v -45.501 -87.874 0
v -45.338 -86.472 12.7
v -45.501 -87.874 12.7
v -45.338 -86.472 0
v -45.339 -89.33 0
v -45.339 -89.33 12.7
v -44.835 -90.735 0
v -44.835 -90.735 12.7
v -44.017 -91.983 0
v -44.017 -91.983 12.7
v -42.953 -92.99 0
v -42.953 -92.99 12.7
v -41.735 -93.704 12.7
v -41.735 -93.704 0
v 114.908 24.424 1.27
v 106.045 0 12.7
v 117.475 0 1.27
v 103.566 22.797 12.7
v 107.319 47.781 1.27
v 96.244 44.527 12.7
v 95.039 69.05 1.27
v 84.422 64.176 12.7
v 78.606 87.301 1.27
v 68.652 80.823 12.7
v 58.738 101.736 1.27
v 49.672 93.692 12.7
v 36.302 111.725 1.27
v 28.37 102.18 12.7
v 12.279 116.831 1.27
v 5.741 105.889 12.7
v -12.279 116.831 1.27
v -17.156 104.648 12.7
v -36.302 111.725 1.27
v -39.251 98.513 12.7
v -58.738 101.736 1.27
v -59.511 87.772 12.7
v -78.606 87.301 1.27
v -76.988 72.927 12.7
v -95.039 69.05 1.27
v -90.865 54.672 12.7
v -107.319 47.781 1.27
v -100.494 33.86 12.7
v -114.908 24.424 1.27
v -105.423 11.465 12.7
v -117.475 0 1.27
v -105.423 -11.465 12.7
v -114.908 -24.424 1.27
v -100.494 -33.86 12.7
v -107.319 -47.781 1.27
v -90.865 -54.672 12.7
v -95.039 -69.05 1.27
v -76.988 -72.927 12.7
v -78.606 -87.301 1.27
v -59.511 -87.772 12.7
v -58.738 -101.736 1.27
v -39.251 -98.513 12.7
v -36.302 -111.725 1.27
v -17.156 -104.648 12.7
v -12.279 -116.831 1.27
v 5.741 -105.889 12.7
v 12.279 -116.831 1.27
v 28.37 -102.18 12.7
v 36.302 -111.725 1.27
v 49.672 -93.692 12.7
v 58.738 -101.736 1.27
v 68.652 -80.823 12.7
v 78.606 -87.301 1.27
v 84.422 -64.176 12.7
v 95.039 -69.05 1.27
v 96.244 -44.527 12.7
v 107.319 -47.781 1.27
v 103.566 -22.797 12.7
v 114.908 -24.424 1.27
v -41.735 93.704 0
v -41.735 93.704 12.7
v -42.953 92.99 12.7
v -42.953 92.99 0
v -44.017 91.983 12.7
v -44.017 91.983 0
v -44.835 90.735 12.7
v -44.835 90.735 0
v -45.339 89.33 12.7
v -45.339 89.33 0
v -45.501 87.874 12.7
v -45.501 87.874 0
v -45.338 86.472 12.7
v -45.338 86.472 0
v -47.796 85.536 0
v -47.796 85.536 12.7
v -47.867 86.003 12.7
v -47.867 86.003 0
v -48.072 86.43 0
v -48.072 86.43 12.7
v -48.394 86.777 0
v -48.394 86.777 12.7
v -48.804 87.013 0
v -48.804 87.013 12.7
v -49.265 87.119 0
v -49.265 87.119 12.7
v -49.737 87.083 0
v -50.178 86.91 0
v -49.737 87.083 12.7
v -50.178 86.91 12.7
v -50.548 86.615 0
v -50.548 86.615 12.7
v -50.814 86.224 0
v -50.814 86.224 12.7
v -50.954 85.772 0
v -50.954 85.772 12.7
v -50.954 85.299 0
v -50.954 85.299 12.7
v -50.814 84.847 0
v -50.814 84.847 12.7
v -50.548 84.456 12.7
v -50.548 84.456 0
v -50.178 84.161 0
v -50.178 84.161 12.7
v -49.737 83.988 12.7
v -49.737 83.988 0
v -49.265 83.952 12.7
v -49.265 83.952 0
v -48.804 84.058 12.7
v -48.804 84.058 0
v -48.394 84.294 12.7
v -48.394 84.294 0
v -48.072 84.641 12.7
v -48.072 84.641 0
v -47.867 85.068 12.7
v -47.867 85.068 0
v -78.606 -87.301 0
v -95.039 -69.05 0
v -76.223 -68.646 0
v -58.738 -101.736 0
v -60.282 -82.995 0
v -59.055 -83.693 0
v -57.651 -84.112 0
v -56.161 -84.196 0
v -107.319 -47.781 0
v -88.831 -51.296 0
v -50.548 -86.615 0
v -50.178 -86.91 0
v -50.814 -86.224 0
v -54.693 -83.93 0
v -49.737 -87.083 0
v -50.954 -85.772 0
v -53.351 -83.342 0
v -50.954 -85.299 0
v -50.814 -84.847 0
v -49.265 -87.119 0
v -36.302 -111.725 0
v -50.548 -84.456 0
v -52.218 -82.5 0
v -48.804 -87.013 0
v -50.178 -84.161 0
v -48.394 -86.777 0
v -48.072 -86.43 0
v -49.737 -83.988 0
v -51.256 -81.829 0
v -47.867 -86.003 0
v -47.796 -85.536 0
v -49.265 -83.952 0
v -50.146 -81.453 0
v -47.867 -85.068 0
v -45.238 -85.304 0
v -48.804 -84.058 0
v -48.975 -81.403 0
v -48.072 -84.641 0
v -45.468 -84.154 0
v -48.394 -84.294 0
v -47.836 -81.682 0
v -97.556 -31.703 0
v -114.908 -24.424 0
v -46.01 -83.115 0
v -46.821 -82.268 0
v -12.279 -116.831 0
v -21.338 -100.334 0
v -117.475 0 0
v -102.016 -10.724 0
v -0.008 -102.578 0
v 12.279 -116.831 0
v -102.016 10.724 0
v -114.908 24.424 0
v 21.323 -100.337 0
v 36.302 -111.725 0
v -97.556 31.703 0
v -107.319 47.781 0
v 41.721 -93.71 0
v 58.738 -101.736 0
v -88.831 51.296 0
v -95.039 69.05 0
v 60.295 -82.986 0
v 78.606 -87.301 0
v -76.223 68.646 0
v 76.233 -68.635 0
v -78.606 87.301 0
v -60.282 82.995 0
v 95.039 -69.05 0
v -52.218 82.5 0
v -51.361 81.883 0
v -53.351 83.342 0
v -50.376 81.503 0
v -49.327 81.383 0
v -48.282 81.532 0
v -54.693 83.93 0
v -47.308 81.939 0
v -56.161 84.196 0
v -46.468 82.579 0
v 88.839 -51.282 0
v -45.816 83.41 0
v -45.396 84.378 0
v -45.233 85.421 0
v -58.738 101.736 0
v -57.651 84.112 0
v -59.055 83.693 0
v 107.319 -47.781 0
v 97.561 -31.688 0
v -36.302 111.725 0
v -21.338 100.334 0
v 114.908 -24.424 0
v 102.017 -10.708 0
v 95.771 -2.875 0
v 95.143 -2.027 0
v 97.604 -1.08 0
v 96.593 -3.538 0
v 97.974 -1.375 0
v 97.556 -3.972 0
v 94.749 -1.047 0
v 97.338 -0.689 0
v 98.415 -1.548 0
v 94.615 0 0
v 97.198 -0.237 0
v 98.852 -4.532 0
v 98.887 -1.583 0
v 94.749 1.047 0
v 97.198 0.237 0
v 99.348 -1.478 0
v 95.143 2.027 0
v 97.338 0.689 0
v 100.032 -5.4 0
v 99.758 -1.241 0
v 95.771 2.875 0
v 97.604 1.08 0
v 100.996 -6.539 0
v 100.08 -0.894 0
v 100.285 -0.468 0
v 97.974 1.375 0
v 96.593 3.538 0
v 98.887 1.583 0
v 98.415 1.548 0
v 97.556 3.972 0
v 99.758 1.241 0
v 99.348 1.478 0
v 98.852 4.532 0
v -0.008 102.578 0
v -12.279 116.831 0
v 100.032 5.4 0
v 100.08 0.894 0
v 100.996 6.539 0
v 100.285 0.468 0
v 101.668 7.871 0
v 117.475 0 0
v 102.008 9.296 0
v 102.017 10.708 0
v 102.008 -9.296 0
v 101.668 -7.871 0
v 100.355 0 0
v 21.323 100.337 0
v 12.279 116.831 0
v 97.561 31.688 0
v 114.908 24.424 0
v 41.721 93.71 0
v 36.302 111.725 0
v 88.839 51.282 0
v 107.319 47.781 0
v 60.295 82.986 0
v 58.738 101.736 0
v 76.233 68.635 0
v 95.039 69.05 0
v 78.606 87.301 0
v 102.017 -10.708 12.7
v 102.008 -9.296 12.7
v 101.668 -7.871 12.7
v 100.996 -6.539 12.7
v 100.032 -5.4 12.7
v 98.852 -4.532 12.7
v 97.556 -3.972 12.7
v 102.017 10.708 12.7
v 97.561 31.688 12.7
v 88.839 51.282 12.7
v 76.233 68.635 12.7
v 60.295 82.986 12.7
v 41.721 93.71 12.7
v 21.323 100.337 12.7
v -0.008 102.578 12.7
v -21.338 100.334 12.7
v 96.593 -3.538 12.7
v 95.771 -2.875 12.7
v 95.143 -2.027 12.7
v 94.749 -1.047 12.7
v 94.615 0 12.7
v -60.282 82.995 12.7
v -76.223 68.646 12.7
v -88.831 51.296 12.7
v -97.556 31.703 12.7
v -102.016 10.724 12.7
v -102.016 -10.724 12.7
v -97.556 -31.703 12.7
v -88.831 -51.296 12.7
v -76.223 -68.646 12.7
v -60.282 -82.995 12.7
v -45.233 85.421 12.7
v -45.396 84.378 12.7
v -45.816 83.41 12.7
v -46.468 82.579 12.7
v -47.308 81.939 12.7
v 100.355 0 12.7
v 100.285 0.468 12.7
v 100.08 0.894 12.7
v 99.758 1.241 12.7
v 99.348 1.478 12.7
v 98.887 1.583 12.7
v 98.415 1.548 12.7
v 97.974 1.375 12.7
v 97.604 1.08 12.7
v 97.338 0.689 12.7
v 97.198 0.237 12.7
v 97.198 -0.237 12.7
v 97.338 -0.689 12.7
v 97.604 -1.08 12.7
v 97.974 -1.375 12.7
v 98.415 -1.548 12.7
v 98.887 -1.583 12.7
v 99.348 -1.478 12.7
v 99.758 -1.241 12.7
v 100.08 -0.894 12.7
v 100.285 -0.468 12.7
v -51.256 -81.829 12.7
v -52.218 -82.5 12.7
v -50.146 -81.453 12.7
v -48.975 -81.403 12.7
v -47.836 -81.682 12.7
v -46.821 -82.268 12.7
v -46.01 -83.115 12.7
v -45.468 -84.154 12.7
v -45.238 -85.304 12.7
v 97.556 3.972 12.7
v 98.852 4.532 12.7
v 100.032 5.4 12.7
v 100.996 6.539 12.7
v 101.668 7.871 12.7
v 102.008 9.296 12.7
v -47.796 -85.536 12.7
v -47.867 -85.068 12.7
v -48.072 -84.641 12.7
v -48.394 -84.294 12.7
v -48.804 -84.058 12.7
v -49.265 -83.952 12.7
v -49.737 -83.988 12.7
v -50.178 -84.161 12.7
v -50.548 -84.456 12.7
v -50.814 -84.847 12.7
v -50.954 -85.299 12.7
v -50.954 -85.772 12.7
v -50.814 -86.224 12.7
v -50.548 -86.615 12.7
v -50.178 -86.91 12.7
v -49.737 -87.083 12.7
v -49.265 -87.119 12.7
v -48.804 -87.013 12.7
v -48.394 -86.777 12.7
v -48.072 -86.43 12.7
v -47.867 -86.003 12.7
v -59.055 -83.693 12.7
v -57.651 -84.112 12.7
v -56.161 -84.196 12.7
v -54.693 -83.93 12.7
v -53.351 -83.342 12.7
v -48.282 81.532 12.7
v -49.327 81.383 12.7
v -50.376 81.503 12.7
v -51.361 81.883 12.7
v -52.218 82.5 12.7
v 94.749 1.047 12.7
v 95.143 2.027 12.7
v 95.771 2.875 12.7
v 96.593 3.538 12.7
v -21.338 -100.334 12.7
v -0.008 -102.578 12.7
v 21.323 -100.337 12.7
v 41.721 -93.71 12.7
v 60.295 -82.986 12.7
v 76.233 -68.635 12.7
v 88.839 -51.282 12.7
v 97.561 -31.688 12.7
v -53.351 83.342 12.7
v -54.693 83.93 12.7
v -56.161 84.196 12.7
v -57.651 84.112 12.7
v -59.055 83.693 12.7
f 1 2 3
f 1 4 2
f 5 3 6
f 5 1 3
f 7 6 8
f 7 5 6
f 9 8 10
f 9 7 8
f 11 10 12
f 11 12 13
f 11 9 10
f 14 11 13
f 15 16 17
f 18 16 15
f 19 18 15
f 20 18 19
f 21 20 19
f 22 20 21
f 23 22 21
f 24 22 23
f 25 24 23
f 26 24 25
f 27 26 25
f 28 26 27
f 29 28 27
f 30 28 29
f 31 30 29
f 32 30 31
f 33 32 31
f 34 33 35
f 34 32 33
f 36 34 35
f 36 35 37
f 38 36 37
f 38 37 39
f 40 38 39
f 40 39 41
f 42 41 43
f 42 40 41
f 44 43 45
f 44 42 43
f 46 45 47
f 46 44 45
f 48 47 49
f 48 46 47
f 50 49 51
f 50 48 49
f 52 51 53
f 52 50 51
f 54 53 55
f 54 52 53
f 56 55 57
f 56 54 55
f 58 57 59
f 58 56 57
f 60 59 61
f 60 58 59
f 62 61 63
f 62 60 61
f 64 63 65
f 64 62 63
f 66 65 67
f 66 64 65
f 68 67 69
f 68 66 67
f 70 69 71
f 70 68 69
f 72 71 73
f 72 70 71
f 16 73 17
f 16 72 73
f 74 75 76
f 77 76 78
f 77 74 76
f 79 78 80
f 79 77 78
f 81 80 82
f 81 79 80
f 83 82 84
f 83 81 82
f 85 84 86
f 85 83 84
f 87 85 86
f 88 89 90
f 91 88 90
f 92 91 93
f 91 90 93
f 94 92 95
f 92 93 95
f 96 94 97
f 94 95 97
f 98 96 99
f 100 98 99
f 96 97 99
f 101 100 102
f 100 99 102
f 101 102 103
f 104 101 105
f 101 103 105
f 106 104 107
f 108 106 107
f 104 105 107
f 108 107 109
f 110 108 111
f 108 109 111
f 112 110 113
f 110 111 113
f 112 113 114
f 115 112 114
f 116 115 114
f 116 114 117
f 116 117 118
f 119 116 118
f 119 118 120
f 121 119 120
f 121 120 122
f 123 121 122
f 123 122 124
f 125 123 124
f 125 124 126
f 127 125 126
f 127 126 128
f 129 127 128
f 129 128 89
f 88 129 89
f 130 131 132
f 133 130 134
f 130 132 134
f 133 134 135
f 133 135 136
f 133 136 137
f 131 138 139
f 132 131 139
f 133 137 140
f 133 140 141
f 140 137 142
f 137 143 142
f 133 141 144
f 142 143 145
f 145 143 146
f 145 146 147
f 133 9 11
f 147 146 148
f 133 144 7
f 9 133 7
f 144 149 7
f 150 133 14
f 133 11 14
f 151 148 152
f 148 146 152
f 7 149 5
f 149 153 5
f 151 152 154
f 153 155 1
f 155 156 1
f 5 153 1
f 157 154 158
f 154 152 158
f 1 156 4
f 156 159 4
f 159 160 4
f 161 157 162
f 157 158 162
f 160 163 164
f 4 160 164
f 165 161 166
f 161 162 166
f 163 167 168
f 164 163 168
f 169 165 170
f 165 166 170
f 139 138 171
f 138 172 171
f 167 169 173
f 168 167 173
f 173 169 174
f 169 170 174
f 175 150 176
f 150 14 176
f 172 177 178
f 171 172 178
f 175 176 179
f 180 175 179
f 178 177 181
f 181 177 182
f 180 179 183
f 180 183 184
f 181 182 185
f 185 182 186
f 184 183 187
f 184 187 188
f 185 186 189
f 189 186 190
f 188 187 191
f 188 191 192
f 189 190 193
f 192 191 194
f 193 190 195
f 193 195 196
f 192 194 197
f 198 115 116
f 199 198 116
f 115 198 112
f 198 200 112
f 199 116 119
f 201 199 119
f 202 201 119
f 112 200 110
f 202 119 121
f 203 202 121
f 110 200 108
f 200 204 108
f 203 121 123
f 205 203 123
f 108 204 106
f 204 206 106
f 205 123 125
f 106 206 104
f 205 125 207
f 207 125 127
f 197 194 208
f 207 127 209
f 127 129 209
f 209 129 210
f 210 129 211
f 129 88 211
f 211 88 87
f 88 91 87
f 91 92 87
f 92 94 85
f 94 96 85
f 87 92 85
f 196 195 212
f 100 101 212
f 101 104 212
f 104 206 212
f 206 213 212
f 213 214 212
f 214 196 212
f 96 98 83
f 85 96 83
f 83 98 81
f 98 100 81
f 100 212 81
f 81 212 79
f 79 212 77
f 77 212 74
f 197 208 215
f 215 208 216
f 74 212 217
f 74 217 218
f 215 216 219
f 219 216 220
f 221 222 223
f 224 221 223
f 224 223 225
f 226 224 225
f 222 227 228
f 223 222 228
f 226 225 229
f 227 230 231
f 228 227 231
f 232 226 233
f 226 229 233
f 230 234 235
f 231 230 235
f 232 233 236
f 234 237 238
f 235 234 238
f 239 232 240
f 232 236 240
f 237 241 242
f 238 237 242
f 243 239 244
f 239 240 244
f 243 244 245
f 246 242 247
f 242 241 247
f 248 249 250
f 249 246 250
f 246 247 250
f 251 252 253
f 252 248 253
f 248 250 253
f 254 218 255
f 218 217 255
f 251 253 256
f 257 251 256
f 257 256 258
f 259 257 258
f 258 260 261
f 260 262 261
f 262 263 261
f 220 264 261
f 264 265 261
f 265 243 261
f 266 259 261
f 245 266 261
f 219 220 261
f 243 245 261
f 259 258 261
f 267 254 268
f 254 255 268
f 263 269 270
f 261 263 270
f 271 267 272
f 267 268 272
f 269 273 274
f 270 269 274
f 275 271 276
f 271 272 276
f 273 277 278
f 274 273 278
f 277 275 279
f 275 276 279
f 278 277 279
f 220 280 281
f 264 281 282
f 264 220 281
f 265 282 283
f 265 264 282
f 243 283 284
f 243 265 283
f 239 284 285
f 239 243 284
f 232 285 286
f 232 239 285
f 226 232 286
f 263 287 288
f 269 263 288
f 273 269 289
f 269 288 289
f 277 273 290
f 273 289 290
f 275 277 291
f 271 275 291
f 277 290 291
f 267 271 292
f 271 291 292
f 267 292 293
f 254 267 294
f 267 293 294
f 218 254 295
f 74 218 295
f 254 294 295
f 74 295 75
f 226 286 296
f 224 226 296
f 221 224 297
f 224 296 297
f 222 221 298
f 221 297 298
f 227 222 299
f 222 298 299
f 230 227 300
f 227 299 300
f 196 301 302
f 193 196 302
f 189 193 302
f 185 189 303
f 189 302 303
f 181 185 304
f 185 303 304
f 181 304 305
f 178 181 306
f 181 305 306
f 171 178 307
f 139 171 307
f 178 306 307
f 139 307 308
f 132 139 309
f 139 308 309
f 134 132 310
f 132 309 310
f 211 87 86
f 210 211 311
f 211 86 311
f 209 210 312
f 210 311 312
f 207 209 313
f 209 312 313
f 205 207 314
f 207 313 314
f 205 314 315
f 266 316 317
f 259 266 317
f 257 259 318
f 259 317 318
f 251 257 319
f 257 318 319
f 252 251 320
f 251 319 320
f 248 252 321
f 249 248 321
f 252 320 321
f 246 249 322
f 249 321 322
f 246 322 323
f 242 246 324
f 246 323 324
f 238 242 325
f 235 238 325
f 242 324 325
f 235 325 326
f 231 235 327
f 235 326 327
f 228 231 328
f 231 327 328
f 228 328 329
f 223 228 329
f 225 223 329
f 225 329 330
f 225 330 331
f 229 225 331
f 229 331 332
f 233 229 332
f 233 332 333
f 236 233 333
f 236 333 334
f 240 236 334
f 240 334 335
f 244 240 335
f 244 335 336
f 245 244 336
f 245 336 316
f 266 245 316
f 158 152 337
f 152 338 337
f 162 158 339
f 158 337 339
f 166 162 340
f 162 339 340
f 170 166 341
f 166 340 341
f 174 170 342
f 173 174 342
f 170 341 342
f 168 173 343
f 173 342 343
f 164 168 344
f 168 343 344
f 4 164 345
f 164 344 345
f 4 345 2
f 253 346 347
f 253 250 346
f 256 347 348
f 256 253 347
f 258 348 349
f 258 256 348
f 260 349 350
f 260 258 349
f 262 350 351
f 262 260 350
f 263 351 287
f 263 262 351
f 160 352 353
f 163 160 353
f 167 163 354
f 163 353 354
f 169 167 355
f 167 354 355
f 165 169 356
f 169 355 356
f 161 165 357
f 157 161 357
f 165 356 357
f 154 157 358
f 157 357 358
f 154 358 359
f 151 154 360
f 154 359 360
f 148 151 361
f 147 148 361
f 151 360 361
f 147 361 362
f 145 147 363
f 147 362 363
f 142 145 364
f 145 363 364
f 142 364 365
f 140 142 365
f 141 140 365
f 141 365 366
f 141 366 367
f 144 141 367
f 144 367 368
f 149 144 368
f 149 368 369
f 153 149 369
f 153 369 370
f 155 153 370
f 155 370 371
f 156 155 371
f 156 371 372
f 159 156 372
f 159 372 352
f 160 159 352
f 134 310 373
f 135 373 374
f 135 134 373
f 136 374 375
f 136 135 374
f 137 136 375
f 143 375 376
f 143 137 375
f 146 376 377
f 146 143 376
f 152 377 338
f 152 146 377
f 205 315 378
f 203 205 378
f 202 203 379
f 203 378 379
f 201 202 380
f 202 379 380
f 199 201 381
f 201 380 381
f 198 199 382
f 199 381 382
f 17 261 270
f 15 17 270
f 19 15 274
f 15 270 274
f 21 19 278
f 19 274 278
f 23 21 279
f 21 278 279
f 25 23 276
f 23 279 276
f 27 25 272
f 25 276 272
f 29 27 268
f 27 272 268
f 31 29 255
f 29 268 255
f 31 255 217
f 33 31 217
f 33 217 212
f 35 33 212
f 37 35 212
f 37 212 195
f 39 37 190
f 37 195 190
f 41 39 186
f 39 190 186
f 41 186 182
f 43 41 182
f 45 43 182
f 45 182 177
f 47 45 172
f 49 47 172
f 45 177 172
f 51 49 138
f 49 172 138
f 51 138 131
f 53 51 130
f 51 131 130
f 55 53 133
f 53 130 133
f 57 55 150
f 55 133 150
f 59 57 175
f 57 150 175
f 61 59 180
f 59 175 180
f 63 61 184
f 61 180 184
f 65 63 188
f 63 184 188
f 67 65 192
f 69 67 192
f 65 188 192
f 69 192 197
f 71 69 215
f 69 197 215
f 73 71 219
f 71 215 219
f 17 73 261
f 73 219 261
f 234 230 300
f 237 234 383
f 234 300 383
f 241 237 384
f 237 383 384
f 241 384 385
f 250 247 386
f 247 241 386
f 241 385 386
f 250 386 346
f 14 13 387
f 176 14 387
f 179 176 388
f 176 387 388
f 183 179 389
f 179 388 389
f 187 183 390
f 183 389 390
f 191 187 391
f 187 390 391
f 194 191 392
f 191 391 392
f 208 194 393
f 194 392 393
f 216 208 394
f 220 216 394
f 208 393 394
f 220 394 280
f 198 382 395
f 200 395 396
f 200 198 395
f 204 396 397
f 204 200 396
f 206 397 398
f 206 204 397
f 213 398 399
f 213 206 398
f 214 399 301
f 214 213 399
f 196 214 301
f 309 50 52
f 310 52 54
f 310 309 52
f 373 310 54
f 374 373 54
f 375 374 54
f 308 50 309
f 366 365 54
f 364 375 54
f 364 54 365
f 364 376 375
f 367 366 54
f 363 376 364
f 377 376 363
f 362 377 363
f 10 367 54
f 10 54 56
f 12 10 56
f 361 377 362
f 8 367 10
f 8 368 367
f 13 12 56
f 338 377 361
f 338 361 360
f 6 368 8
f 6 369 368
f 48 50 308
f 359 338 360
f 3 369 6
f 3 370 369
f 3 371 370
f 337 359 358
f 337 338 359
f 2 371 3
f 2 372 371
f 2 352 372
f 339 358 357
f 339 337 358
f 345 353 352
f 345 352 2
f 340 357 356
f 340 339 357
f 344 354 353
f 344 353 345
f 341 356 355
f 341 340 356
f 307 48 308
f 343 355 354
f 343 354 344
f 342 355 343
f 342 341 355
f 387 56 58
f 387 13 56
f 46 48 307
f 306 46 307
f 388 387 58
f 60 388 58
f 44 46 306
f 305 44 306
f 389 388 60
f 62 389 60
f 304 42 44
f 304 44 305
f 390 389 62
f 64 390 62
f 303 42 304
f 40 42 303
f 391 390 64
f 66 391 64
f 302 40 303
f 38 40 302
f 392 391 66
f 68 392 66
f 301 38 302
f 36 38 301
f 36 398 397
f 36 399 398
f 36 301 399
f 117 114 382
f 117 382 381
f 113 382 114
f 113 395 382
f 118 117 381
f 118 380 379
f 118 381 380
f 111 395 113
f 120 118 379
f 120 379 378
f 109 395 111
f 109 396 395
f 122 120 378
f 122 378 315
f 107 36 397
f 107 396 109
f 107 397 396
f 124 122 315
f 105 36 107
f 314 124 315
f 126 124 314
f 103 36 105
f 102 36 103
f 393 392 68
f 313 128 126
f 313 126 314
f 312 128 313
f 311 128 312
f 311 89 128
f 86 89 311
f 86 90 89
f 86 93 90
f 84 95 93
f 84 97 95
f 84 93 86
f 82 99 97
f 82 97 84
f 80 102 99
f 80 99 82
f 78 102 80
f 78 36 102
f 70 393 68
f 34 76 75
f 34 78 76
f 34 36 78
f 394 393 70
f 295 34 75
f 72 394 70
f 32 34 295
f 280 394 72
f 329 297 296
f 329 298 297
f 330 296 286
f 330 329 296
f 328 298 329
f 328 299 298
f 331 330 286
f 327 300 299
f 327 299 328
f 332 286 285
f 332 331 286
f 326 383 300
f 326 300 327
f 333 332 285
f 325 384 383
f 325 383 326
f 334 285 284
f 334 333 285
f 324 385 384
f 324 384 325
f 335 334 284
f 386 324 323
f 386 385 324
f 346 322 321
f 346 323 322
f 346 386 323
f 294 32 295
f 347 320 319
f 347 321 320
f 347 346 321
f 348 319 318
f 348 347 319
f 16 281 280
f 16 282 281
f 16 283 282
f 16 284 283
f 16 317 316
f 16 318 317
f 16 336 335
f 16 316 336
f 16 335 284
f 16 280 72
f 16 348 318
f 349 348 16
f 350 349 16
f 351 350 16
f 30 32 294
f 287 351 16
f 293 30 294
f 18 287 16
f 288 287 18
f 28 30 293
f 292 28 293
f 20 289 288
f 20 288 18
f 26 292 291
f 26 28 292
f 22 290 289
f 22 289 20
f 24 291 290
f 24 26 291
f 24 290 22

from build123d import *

# Parameters (mm, degrees)
F0_R     = 117.475
F0_R_2   = 94.615
F1_DEPTH = 12.7
F2_SIZE2 = 11.43
F2_SIZE  = 11.43
F3_R     = 1.5875
F4_DEPTH = 25.4
F5_DEPTH = 25.4
F6_R     = 6.35


with BuildPart() as f1:
    # F0 (on Top) → F1 (new body)
    with BuildSketch(Plane.XY):
        Circle(F0_R)
        Circle(F0_R_2, mode=Mode.SUBTRACT)
    extrude(amount=F1_DEPTH)

    # F2
    f2_edges = [f1.edges().sort_by_distance(p)[0] for p in [
        (-117.475, 0, 12.7),
    ]]
    chamfer(f2_edges, length=F2_SIZE, length2=F2_SIZE2)

    # F3 (on face) → F4 (cut)
    with BuildSketch(Plane.XY.offset(12.7)):
        with Locations((-49.38395, -85.5355104784)):
            Circle(F3_R)
        with Locations((98.7679, 0)):
            Circle(F3_R)
        with Locations((-49.38395, 85.5355104784)):
            Circle(F3_R)
    extrude(amount=-F4_DEPTH, mode=Mode.SUBTRACT)

    # F3 (on face) → F5 (cut)
    with BuildSketch(Plane.XY.offset(12.7)):
        with BuildLine():
            ThreePointArc((-47.3074999758, -81.938993593), (-94.615, -6.48e-08), (-47.307500088, 81.9389935282))
            ThreePointArc((-47.307500088, 81.9389935282), (-50.5319062243, 81.5444235442), (-53.0539246015, 83.5918374518))
            Line((-53.0539246015, 83.5918374518), (-54.8410720868, 86.687267697))
            ThreePointArc((-54.8410720868, 86.687267697), (-102.5778999906, 0.0013872619), (-54.8434167812, -86.6857843258))
            Line((-54.8434167812, -86.6857843258), (-52.9804668994, -83.4590604784))
            ThreePointArc((-52.9804668994, -83.4590604784), (-50.4587995989, -81.5241171108), (-47.3074999758, -81.938993593))
        make_face()
        with BuildLine():
            Line((98.9196170831, 4.1501277494), (102.4939120537, 4.1501277494))
            ThreePointArc((102.4939120537, 4.1501277494), (51.2901513993, 88.8343736278), (-47.6503829825, 90.8386843258))
            Line((-47.6503829825, 90.8386843258), (-45.7874331006, 87.6119604784))
            ThreePointArc((-45.7874331006, 87.6119604784), (-45.3725566492, 84.4606608169), (-47.307500088, 81.9389935282))
            ThreePointArc((-47.307500088, 81.9389935282), (47.307499956, 81.9389936045), (94.615, 0))
            ThreePointArc((94.615, 0), (95.8854954018, 2.9897026846), (98.9196170831, 4.1501277494))
        make_face()
        with BuildLine():
            ThreePointArc((98.7679, -4.1529), (95.8313562484, -2.9365437516), (94.615, 0))
            ThreePointArc((94.615, 0), (47.3075000121, -81.9389935721), (-47.3074999758, -81.938993593))
            ThreePointArc((-47.3074999758, -81.938993593), (-45.3535892229, -84.5341262282), (-45.8656924816, -87.7419652013))
            Line((-45.8656924816, -87.7419652013), (-47.6528399669, -90.8373954465))
            ThreePointArc((-47.6528399669, -90.8373954465), (51.2877485913, -88.8357608897), (102.4937997637, -4.1529))
            Line((102.4937997637, -4.1529), (98.7679, -4.1529))
        make_face()
    extrude(amount=-F5_DEPTH, mode=Mode.SUBTRACT)

    # F6
    f6_edges = [f1.edges().sort_by_distance(p)[0] for p in [
        (-54.841072, 86.687268, 6.35),
        (-47.650383, 90.838684, 6.35),
        (102.4938, -4.1529, 6.35),
        (102.493912, 4.150128, 6.35),
        (-54.843417, -86.685784, 6.35),
        (-47.65284, -90.837395, 6.35),
    ]]
    fillet(f6_edges, radius=F6_R)


solid = f1.part
